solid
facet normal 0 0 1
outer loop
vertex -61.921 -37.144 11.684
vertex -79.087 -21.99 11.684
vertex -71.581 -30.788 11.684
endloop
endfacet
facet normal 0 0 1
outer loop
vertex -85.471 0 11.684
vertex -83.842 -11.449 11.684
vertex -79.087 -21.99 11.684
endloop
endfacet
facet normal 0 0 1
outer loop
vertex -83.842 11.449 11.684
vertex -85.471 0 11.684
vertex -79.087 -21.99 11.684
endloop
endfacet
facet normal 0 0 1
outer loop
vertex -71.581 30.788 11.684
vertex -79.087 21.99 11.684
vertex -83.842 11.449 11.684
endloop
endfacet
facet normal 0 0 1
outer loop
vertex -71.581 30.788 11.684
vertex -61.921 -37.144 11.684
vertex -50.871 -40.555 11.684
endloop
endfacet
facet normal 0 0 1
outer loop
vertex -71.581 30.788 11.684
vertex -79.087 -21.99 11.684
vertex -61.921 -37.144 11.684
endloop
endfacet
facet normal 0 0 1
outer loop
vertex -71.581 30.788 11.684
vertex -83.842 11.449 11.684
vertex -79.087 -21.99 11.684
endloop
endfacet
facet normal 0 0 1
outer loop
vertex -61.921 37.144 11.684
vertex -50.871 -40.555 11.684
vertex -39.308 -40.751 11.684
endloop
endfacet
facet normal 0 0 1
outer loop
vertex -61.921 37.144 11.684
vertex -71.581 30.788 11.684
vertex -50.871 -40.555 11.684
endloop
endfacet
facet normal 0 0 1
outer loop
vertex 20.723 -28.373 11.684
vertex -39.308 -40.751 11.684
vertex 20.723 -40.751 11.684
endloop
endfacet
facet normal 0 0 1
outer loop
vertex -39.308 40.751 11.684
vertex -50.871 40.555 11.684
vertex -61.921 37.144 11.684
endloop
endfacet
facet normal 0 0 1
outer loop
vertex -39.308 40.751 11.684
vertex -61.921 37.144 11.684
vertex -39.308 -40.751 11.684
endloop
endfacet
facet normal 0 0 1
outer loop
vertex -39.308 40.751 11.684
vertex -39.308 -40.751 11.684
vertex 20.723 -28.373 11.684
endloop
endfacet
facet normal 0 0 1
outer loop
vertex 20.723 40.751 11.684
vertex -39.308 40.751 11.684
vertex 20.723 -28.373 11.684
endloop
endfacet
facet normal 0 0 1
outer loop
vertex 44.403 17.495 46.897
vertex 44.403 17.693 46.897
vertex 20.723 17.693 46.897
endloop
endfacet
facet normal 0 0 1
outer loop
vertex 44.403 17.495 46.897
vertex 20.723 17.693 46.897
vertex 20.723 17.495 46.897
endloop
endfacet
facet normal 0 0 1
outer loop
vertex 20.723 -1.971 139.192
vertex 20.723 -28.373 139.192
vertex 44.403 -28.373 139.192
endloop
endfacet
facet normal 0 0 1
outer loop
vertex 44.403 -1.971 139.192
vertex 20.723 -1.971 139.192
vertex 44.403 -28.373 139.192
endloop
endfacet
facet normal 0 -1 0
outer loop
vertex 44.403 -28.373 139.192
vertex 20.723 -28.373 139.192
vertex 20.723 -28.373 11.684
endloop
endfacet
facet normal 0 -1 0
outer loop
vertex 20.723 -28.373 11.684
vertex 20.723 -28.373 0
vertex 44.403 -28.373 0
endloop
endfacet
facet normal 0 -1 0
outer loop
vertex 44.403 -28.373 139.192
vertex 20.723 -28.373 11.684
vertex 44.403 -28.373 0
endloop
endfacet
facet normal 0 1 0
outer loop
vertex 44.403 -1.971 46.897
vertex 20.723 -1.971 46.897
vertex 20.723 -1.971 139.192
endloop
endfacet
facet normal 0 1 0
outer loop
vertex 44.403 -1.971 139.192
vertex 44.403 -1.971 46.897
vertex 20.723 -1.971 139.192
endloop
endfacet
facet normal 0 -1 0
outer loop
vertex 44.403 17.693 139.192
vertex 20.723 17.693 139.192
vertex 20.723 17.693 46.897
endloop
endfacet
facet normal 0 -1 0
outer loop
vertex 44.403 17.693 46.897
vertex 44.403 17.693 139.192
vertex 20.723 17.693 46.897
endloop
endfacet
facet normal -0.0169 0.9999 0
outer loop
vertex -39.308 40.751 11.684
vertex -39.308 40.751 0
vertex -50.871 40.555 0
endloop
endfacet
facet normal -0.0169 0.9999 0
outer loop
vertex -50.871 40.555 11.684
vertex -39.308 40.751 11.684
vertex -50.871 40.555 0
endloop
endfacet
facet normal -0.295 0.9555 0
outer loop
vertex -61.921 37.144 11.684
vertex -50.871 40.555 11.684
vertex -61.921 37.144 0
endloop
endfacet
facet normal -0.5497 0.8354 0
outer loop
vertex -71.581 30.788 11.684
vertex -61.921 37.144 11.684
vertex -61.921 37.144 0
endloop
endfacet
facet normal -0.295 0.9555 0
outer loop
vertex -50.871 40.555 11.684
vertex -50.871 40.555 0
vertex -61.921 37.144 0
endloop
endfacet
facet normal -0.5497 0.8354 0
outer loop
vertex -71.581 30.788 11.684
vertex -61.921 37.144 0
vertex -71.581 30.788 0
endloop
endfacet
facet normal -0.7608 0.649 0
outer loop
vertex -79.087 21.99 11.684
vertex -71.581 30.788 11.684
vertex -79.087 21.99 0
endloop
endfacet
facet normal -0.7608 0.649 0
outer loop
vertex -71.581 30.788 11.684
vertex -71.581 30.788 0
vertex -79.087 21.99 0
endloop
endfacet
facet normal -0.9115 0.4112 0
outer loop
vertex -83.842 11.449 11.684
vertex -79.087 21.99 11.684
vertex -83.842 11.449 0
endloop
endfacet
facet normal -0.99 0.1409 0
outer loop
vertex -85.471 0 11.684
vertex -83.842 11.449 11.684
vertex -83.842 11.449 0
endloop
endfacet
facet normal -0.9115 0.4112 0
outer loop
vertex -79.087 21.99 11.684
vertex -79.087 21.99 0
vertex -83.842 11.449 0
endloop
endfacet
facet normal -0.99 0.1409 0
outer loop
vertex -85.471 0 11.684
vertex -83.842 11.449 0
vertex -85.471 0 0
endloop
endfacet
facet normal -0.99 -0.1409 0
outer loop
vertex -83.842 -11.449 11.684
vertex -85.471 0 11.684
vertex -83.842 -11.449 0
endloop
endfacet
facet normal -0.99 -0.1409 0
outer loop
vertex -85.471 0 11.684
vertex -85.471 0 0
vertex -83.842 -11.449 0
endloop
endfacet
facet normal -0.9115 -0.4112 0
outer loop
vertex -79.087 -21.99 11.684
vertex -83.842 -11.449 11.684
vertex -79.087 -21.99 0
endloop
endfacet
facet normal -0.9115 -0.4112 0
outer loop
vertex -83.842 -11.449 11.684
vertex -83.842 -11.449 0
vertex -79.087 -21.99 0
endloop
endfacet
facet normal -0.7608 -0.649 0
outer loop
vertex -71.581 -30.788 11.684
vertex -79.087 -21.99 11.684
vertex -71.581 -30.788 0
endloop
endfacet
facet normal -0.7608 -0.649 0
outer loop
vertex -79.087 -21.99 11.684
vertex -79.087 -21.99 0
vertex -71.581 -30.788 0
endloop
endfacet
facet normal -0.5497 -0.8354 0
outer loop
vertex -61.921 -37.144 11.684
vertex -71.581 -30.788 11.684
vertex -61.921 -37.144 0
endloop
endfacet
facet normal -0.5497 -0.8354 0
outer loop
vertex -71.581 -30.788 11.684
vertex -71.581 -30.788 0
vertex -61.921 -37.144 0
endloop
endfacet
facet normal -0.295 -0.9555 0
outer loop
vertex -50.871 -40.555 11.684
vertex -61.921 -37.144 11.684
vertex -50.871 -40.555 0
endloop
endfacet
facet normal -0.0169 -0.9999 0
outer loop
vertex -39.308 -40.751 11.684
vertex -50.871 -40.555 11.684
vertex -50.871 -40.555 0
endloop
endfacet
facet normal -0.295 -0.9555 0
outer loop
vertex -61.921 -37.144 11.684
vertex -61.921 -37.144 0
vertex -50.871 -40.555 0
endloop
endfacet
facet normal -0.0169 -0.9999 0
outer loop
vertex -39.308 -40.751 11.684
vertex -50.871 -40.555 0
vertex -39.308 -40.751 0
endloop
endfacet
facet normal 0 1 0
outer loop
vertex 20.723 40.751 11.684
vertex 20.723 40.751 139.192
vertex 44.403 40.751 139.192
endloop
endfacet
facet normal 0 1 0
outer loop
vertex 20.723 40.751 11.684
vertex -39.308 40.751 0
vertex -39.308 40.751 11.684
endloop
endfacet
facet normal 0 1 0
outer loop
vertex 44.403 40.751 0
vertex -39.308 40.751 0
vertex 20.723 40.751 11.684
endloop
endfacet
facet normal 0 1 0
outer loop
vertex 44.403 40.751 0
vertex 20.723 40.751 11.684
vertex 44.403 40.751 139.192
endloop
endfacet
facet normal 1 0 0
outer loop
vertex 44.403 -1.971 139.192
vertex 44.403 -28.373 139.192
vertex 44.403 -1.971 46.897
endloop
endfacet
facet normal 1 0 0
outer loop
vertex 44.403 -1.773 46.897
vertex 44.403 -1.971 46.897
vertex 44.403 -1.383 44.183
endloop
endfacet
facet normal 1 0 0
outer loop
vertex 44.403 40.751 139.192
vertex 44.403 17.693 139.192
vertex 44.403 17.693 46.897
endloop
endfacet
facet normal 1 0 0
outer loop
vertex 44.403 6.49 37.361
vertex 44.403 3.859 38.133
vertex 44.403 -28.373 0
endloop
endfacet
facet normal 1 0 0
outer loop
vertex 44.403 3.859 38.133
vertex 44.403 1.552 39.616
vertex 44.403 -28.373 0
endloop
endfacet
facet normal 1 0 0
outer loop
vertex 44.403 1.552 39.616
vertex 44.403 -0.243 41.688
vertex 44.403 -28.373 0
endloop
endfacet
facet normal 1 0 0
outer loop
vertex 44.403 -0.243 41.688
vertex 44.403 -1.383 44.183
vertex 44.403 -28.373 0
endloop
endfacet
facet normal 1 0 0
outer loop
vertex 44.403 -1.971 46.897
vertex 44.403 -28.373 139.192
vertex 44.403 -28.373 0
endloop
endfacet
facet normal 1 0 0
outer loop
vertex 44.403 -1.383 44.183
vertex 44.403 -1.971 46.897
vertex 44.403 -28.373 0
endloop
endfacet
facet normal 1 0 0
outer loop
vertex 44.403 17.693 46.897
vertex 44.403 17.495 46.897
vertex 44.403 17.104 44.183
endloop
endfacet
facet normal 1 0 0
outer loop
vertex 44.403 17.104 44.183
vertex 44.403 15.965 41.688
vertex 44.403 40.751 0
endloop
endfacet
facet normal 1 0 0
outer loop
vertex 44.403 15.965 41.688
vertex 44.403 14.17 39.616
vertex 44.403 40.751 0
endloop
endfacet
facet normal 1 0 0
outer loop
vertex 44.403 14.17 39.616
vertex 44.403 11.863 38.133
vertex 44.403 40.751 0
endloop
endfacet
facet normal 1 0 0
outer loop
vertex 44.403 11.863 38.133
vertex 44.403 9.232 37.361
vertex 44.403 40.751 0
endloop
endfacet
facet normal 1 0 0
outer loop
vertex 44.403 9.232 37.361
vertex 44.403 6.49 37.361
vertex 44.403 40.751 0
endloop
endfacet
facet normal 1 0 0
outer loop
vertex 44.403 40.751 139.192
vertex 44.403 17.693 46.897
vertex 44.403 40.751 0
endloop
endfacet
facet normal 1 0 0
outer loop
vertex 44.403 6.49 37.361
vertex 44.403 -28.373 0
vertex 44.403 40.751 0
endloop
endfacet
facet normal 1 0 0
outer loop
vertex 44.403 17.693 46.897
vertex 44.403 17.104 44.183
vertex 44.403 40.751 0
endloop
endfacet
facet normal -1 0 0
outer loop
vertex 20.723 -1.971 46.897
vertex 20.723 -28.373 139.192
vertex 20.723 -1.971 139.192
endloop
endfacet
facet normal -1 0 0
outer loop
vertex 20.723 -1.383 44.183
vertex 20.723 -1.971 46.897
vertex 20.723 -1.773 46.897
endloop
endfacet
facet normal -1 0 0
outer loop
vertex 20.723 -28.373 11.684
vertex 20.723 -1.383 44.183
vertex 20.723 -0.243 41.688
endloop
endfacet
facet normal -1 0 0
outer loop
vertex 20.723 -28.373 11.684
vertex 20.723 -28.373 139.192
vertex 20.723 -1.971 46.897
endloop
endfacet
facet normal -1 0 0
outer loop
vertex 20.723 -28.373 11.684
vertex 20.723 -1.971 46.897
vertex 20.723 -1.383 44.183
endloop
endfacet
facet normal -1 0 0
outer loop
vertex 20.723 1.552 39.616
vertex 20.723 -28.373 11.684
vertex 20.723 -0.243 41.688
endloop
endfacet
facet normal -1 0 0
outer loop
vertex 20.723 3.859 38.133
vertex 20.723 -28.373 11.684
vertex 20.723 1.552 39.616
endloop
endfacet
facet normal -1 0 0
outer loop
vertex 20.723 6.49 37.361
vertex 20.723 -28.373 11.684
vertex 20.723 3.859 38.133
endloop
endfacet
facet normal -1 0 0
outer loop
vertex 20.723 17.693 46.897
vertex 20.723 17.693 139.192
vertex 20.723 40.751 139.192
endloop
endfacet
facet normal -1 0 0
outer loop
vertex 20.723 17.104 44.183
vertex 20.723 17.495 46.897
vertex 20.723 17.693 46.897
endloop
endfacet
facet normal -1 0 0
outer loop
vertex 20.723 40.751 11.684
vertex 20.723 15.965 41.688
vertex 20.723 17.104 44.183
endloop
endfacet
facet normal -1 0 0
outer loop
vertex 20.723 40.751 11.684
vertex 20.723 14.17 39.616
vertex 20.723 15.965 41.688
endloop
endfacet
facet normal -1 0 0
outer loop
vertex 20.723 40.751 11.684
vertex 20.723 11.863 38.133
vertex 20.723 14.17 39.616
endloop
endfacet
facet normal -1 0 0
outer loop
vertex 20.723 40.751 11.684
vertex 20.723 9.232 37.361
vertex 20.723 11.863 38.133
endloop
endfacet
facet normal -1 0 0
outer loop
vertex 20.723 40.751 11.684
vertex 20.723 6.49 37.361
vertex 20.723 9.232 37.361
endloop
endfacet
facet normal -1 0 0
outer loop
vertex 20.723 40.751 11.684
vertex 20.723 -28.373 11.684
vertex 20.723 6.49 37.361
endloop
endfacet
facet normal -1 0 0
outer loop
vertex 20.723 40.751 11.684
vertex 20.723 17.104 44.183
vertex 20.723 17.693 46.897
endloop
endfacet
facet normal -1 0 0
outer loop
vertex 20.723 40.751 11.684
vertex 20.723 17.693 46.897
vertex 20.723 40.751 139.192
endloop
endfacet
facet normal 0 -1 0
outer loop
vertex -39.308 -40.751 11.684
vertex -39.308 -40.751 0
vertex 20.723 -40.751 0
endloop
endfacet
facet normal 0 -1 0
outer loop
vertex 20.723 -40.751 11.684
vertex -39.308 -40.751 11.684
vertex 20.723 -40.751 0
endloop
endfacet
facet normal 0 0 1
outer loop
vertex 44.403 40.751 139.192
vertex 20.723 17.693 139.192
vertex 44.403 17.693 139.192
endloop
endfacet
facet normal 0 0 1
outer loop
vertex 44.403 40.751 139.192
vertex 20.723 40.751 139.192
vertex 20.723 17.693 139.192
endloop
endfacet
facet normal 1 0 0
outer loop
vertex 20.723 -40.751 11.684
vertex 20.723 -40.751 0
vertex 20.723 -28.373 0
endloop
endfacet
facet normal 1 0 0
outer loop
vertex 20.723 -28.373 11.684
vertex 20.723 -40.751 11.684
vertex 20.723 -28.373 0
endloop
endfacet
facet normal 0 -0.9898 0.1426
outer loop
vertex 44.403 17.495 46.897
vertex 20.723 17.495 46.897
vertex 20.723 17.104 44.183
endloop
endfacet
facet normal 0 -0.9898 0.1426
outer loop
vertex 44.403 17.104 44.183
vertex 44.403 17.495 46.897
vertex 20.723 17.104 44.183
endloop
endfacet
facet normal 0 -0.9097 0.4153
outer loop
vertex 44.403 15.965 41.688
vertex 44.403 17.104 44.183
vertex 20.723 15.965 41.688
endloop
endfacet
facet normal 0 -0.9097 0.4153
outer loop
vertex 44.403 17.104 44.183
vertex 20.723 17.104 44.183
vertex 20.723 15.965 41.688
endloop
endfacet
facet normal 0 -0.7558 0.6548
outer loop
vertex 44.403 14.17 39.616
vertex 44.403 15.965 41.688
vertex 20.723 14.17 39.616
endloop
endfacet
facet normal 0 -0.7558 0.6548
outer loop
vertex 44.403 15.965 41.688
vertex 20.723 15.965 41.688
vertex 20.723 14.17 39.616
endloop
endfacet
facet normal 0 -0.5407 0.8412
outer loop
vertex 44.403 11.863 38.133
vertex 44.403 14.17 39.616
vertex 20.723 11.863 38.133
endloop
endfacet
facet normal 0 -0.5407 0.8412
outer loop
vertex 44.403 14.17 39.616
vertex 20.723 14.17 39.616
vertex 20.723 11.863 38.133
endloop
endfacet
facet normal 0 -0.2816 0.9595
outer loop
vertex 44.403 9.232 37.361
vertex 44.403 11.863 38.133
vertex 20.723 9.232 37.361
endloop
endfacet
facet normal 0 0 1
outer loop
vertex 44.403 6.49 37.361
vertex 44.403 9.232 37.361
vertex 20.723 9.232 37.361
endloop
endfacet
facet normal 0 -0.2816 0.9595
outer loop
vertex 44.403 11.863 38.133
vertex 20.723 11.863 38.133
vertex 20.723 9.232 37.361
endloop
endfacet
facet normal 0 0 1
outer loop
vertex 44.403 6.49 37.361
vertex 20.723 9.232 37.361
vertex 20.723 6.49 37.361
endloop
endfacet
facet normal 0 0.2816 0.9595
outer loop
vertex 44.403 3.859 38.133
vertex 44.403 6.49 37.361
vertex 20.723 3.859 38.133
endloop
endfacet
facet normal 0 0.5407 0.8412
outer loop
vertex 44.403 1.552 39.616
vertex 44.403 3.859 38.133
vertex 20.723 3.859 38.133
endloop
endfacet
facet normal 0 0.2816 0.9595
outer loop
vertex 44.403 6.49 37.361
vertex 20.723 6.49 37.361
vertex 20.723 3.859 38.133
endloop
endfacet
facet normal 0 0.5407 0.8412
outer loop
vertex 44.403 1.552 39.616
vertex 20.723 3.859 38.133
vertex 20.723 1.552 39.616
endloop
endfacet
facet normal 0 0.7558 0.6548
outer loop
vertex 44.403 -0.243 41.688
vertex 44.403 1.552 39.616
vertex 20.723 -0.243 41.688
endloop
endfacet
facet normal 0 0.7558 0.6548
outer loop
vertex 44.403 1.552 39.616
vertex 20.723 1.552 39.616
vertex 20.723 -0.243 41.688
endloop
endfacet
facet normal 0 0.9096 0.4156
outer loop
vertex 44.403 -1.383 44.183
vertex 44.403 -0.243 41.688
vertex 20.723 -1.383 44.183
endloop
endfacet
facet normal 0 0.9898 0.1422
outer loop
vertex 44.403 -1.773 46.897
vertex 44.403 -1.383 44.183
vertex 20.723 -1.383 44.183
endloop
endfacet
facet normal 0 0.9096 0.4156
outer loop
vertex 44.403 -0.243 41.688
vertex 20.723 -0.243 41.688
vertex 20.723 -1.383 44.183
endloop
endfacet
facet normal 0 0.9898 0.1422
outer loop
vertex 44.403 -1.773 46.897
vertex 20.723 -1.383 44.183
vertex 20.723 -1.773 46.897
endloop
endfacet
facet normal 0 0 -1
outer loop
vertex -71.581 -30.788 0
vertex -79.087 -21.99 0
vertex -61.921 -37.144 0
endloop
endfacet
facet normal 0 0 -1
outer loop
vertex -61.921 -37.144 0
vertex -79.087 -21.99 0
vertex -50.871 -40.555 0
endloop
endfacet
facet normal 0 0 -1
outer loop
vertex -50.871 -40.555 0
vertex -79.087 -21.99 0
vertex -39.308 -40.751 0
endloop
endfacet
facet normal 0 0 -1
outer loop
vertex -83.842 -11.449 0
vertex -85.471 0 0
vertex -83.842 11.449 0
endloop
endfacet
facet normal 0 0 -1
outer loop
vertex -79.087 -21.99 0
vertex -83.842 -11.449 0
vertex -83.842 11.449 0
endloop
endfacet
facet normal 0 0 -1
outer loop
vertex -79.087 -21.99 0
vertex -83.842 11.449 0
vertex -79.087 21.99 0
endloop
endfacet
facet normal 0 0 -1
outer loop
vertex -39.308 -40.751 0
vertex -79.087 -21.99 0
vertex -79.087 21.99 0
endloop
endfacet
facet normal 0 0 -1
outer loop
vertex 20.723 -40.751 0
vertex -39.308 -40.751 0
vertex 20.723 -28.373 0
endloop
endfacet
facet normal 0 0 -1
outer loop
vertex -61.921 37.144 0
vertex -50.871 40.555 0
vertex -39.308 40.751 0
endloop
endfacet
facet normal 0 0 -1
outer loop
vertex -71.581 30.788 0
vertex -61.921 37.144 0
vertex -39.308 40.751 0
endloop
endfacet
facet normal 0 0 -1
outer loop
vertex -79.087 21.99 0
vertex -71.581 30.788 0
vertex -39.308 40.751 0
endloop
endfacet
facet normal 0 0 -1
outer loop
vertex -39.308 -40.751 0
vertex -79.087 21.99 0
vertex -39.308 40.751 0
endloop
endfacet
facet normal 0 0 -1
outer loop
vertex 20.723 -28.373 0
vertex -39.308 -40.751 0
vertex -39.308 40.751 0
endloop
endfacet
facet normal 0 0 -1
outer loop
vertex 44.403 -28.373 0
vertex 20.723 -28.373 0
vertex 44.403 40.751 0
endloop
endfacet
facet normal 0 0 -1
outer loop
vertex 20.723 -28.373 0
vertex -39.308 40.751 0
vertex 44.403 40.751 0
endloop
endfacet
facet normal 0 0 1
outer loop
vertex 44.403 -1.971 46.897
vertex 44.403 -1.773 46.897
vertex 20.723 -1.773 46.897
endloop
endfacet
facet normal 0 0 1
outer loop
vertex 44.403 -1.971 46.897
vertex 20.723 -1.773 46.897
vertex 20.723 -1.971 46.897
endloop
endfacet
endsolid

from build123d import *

# Parameters (mm, degrees)
F2_DEPTH = 11.684
F3_W     = 23.6796867102
F3_H     = 69.1230408847
F4_DEPTH = 25.4
F5_DEPTH = 102.108
F7_DEPTH = 25.4
F8_DEPTH = 110.49


with BuildPart() as f2:
    # F0 (on Top) → F2 (new body)
    with BuildSketch(Plane.XY):
        with BuildLine():
            Line((-39.3080597717, -40.7505296171), (20.7232069224, -40.7505296171))
            Line((20.7232069224, -40.7505296171), (20.7232069224, -28.3725112677))
            Line((20.7232069224, -28.3725112677), (44.4028936327, -28.3725112677))
            Line((44.4028936327, -28.3725112677), (44.4028936327, 40.7505296171))
            Line((44.4028936327, 40.7505296171), (-39.3080597717, 40.7505296171))
            ThreePointArc((-39.3080597717, 40.7505296171), (-85.4706790142, 0), (-39.3080597717, -40.7505296171))
        make_face()
    extrude(amount=F2_DEPTH)

    # F3 (on face) → F4 (join)
    with BuildSketch(Plane.XY.offset(11.684)):
        with Locations((32.5630502775, 6.1890091747)):
            Rectangle(F3_W, F3_H)
    extrude(amount=F4_DEPTH)

    # F5 (add): a face of the model
    f5_faces = [f2.faces().sort_by_distance(p)[0] for p in [
        (32.5630502775, 6.1890091747, 37.084),
    ]]
    extrude(f5_faces, amount=F5_DEPTH)

    # F6 (on face) → F7 (join)
    with BuildSketch(Plane(origin=(20.7232069224, 0, 0), x_dir=(0, -1, 0), z_dir=(-1, 0, 0))):
        with BuildLine():
            Line((1.971335616, 139.192), (-17.6932327449, 139.192))
            Line((-17.6932327449, 139.192), (-17.6932327449, 46.8966588378))
            Line((-17.6932327449, 46.8966588378), (-17.4947245486, 46.8966588378))
            ThreePointArc((-17.4947245486, 46.8966588378), (-7.8609485645, 37.2628828536), (1.7728274197, 46.8966588378))
            Line((1.7728274197, 46.8966588378), (1.971335616, 46.8966588378))
            Line((1.971335616, 46.8966588378), (1.971335616, 139.192))
        make_face()
    extrude(amount=F7_DEPTH)

    # F8 (cut): a face of the model
    f8_faces = [f2.faces().sort_by_distance(p)[0] for p in [
        (-4.6767930776, 7.8609485645, 89.3091389319),
    ]]
    extrude(f8_faces, amount=-F8_DEPTH, mode=Mode.SUBTRACT)


solid = f2.part
